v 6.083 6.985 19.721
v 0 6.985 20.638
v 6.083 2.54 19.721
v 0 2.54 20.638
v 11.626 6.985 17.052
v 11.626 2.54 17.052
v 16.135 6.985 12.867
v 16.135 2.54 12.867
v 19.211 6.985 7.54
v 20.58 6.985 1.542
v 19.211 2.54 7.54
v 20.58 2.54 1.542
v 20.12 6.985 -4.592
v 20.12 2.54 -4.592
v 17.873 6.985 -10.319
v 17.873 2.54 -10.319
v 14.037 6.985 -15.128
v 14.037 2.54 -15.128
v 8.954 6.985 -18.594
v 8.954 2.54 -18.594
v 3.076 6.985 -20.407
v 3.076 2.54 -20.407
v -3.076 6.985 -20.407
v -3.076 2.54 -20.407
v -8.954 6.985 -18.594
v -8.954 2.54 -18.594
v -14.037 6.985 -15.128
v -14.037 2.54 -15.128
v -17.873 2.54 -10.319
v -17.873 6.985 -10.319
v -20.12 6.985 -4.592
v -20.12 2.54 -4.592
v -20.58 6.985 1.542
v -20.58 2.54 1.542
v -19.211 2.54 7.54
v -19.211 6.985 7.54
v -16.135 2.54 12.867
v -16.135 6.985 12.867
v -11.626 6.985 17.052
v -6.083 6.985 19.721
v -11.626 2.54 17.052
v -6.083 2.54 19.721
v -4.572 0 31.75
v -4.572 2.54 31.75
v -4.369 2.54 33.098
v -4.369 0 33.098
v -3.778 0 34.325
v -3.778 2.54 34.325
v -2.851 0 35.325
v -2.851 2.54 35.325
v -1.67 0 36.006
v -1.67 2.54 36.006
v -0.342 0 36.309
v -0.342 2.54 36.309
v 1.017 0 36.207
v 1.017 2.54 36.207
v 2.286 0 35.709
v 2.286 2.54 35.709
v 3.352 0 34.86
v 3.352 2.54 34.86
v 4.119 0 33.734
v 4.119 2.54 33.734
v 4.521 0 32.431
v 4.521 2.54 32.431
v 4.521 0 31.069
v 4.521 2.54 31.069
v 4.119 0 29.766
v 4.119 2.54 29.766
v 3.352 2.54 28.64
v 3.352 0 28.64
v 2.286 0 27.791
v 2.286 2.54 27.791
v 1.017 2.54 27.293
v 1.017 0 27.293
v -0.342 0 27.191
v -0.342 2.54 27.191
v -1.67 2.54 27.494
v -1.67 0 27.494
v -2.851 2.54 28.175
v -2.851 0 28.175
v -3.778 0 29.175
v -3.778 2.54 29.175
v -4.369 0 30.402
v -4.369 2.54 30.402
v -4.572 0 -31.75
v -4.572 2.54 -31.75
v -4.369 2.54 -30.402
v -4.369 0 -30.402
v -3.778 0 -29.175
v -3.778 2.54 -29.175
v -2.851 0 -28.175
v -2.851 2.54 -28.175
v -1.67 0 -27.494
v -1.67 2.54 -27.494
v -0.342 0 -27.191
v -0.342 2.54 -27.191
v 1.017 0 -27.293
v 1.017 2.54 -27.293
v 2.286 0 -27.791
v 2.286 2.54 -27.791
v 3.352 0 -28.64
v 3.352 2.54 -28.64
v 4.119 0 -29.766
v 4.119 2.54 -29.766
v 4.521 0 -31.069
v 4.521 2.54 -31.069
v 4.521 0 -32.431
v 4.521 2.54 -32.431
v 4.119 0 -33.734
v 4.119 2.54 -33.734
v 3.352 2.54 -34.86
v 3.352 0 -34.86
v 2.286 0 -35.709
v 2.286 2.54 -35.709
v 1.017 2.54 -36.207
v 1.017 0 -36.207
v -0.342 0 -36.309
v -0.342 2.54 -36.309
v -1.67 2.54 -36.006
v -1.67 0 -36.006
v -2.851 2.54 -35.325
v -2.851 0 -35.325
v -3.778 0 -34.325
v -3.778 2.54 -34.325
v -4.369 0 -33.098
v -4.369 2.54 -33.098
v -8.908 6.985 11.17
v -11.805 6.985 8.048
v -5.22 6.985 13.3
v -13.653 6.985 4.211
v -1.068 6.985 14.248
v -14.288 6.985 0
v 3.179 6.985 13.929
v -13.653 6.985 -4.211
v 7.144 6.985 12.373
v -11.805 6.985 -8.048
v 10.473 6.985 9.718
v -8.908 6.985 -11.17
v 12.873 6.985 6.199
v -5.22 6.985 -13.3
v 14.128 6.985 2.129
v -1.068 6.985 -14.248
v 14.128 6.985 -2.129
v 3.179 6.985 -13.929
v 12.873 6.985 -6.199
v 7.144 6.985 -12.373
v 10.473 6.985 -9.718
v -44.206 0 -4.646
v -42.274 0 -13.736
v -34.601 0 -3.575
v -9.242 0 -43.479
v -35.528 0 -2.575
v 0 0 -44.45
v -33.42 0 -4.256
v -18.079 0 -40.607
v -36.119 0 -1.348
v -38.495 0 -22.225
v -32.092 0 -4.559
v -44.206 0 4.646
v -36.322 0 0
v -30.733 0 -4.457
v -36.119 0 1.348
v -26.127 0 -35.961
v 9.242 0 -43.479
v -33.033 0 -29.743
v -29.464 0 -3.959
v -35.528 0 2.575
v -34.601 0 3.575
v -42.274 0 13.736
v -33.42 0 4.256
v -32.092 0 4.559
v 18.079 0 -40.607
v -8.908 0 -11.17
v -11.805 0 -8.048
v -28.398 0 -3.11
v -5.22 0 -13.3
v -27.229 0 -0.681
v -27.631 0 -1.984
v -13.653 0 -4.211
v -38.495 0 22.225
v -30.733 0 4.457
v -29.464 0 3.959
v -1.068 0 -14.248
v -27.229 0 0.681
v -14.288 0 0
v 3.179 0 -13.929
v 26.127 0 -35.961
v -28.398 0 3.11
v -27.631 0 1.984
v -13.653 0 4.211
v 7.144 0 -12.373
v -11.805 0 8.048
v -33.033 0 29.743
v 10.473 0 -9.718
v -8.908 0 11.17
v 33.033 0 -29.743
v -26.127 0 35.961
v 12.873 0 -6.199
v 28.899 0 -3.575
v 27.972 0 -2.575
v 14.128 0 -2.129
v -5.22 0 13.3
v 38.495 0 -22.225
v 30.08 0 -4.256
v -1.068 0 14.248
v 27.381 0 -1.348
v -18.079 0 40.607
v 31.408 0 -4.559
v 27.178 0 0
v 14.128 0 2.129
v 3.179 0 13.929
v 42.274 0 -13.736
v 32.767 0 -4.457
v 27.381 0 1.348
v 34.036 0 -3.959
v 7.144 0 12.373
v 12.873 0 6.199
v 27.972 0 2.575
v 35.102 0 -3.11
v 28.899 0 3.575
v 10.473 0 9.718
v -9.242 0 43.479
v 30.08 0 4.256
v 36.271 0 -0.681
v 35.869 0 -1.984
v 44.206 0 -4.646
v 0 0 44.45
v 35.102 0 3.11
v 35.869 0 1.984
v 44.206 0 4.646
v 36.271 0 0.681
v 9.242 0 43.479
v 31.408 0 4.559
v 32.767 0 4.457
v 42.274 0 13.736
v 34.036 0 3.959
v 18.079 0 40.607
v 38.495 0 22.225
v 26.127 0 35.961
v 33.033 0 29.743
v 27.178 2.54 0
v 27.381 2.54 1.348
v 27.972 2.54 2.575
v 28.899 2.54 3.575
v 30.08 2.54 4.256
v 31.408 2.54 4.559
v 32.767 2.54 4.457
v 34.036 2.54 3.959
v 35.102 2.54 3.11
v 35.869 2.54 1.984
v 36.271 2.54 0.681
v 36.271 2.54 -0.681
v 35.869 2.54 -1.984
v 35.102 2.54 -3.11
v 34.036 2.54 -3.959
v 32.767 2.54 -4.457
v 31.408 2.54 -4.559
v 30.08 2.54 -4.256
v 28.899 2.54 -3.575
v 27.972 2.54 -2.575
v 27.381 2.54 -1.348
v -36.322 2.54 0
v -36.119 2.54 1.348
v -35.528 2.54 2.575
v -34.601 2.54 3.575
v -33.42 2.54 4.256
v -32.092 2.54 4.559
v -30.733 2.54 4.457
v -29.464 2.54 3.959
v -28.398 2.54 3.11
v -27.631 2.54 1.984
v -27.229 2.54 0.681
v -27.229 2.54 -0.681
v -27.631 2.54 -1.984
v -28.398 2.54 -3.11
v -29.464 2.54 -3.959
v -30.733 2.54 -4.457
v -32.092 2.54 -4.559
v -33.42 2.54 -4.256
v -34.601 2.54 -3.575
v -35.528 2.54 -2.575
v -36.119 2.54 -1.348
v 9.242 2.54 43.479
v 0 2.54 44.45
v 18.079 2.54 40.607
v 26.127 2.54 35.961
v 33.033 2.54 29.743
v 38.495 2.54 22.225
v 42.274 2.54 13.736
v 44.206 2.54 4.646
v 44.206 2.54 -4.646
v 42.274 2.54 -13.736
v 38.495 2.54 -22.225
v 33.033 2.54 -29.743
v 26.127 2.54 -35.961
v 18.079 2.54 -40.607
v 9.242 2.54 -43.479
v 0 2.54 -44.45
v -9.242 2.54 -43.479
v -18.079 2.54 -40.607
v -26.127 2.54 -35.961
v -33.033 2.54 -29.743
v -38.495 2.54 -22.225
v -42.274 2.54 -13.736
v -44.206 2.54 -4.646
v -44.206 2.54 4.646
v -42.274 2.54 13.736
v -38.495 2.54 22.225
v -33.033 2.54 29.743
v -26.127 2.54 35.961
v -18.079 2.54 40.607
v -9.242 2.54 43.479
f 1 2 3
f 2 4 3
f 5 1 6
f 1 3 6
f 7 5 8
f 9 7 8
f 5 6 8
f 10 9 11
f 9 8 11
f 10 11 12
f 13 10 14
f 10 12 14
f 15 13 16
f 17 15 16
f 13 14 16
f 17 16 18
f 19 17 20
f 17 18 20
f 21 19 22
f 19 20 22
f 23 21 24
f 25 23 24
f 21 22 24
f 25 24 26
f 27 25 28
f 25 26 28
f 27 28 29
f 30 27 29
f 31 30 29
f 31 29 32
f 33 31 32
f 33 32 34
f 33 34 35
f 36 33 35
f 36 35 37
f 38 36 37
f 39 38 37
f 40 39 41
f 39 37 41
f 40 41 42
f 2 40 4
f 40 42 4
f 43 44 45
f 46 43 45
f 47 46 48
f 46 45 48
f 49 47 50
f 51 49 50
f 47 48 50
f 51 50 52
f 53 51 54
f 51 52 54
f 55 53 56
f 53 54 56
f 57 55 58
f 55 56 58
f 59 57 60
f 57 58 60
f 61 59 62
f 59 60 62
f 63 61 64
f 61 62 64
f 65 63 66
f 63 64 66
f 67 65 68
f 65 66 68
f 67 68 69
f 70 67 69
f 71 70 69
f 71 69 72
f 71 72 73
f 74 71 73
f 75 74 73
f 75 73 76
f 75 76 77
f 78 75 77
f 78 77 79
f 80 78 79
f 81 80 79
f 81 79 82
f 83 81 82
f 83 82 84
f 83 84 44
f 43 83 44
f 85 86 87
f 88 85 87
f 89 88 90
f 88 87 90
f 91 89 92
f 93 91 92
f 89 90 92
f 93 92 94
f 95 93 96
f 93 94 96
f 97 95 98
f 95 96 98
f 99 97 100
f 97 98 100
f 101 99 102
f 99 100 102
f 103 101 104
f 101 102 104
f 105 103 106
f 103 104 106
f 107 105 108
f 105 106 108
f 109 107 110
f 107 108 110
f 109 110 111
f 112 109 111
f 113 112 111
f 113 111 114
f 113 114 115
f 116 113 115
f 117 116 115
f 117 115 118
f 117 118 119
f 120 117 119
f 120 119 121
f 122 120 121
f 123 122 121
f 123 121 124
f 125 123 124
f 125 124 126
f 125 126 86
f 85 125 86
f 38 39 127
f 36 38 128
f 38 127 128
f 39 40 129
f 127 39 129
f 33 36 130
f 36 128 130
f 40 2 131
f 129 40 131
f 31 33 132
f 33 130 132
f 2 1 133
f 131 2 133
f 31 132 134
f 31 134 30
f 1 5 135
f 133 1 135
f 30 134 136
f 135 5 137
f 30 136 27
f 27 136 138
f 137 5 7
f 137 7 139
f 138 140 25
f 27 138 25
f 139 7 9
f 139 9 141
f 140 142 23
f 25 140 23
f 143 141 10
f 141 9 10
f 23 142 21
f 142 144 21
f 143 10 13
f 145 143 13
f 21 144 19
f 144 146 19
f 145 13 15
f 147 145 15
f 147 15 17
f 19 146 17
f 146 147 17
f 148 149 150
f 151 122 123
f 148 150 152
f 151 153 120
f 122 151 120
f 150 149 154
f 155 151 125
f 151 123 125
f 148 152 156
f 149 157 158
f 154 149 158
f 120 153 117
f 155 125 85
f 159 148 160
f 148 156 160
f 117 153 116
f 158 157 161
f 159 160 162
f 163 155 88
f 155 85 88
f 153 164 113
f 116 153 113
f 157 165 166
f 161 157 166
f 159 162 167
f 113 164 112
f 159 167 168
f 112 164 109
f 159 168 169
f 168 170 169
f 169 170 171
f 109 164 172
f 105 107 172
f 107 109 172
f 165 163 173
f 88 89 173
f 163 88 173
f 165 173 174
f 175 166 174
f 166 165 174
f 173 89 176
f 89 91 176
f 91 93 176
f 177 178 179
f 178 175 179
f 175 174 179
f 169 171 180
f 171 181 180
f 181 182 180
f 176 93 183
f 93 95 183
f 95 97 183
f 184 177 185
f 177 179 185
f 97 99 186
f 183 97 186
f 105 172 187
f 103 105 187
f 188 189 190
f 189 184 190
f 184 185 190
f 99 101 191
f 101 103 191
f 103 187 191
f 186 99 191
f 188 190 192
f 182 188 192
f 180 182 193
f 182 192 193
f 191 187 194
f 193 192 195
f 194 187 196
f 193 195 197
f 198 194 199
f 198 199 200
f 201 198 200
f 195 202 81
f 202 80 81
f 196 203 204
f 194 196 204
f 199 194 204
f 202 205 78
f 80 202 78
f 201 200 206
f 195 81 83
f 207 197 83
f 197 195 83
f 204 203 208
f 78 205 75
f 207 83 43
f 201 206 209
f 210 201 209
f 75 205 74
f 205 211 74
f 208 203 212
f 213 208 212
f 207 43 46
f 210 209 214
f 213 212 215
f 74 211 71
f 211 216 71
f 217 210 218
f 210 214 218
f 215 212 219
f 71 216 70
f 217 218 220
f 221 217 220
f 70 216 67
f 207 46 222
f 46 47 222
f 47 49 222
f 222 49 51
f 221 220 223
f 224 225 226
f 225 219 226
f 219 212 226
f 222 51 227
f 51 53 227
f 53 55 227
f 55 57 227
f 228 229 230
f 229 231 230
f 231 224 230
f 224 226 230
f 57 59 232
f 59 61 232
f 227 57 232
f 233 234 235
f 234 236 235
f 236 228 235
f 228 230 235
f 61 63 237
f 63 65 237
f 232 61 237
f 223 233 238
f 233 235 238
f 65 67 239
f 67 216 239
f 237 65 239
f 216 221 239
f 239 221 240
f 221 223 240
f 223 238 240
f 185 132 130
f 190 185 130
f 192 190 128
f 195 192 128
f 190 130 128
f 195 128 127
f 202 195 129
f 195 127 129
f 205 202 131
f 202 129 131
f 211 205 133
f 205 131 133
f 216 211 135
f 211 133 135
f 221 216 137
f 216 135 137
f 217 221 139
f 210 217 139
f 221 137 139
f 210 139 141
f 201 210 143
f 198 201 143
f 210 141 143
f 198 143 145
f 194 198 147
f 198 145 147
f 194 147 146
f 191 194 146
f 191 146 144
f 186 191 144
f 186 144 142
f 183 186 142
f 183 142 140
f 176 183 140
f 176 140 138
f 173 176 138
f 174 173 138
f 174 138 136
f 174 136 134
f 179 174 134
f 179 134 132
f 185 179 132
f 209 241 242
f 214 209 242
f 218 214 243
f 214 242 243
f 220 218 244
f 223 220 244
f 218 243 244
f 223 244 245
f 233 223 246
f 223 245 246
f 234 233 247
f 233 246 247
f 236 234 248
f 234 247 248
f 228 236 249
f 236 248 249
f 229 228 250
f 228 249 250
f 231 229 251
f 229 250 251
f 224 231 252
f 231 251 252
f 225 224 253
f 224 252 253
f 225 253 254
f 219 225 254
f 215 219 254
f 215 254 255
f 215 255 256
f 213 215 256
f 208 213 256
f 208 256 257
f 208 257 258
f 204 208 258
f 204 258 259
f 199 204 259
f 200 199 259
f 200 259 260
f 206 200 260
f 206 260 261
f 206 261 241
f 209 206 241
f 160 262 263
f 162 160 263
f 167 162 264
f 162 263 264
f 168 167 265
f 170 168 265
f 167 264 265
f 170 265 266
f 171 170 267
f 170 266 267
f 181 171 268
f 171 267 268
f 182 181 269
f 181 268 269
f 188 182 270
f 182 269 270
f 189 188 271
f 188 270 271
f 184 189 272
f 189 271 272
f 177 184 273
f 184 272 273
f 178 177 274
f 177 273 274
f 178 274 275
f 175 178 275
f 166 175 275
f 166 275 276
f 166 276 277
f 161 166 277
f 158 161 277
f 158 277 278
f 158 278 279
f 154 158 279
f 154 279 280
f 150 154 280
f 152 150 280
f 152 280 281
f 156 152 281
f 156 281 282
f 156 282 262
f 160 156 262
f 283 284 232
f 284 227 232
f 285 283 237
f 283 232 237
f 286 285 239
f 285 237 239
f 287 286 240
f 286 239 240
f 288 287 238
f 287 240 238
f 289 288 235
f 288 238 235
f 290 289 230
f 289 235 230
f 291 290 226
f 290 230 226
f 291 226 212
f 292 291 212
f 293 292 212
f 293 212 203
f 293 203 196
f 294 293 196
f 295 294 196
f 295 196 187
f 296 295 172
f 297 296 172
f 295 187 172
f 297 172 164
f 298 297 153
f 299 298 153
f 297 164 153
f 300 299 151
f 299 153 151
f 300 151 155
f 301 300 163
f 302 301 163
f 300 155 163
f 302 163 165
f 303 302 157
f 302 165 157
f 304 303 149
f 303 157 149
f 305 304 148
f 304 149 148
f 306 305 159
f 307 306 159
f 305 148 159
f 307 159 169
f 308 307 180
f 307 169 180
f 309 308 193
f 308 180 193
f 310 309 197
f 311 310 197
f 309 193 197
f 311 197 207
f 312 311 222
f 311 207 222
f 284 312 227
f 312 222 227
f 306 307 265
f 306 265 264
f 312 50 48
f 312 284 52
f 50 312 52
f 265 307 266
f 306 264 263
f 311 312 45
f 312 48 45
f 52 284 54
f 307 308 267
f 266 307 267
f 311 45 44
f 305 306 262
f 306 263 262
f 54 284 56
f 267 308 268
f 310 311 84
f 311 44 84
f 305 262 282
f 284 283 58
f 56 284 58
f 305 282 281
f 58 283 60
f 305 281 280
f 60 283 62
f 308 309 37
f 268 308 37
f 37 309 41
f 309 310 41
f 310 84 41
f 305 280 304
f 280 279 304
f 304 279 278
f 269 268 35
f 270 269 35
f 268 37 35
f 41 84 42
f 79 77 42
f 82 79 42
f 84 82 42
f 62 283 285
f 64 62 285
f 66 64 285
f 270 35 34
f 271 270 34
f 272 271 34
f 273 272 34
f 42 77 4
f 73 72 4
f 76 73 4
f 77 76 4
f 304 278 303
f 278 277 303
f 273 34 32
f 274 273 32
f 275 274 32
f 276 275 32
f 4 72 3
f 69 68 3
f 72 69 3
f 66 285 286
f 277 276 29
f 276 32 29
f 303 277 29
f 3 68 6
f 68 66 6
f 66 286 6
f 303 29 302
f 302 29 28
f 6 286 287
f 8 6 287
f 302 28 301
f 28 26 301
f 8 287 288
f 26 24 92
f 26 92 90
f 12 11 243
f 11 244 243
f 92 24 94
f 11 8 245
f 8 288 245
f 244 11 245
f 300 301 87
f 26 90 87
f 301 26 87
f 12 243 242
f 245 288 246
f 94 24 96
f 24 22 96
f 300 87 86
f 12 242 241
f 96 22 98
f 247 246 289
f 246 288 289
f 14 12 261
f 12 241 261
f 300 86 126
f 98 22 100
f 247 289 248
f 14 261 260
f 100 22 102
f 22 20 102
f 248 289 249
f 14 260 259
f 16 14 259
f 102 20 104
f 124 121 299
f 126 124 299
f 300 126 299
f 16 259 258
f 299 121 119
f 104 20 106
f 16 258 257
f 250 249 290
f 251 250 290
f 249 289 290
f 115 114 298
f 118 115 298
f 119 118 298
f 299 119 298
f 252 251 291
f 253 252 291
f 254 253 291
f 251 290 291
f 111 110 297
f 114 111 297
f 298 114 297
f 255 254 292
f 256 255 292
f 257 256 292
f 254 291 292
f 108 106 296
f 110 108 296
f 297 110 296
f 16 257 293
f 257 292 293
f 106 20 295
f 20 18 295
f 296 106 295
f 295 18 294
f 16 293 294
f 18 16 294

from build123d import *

# Parameters (mm, degrees)
F3_D = 28.575
F4_D = 9.144


with BuildPart() as f1:
    # F0 (on Right) → F1 (revolve)
    with BuildSketch(Plane.YZ):
        Polygon((0, 44.45), (0, 0), (6.985, 0), (6.985, 20.6375), (2.54, 20.6375), (2.54, 44.45), align=None)
    revolve(axis=Axis((0, 6.35, 0), (0, 1, 0)))

    # F3 (through all)
    with Locations(Plane.XZ):
        with Locations((0, 0)):
            Hole(F3_D / 2)

    # F4 (through all)
    with Locations(Plane.XZ):
        with Locations((0, 31.75), (31.75, 0), (0, -31.75), (-31.75, 0)):
            Hole(F4_D / 2)


solid = f1.part
